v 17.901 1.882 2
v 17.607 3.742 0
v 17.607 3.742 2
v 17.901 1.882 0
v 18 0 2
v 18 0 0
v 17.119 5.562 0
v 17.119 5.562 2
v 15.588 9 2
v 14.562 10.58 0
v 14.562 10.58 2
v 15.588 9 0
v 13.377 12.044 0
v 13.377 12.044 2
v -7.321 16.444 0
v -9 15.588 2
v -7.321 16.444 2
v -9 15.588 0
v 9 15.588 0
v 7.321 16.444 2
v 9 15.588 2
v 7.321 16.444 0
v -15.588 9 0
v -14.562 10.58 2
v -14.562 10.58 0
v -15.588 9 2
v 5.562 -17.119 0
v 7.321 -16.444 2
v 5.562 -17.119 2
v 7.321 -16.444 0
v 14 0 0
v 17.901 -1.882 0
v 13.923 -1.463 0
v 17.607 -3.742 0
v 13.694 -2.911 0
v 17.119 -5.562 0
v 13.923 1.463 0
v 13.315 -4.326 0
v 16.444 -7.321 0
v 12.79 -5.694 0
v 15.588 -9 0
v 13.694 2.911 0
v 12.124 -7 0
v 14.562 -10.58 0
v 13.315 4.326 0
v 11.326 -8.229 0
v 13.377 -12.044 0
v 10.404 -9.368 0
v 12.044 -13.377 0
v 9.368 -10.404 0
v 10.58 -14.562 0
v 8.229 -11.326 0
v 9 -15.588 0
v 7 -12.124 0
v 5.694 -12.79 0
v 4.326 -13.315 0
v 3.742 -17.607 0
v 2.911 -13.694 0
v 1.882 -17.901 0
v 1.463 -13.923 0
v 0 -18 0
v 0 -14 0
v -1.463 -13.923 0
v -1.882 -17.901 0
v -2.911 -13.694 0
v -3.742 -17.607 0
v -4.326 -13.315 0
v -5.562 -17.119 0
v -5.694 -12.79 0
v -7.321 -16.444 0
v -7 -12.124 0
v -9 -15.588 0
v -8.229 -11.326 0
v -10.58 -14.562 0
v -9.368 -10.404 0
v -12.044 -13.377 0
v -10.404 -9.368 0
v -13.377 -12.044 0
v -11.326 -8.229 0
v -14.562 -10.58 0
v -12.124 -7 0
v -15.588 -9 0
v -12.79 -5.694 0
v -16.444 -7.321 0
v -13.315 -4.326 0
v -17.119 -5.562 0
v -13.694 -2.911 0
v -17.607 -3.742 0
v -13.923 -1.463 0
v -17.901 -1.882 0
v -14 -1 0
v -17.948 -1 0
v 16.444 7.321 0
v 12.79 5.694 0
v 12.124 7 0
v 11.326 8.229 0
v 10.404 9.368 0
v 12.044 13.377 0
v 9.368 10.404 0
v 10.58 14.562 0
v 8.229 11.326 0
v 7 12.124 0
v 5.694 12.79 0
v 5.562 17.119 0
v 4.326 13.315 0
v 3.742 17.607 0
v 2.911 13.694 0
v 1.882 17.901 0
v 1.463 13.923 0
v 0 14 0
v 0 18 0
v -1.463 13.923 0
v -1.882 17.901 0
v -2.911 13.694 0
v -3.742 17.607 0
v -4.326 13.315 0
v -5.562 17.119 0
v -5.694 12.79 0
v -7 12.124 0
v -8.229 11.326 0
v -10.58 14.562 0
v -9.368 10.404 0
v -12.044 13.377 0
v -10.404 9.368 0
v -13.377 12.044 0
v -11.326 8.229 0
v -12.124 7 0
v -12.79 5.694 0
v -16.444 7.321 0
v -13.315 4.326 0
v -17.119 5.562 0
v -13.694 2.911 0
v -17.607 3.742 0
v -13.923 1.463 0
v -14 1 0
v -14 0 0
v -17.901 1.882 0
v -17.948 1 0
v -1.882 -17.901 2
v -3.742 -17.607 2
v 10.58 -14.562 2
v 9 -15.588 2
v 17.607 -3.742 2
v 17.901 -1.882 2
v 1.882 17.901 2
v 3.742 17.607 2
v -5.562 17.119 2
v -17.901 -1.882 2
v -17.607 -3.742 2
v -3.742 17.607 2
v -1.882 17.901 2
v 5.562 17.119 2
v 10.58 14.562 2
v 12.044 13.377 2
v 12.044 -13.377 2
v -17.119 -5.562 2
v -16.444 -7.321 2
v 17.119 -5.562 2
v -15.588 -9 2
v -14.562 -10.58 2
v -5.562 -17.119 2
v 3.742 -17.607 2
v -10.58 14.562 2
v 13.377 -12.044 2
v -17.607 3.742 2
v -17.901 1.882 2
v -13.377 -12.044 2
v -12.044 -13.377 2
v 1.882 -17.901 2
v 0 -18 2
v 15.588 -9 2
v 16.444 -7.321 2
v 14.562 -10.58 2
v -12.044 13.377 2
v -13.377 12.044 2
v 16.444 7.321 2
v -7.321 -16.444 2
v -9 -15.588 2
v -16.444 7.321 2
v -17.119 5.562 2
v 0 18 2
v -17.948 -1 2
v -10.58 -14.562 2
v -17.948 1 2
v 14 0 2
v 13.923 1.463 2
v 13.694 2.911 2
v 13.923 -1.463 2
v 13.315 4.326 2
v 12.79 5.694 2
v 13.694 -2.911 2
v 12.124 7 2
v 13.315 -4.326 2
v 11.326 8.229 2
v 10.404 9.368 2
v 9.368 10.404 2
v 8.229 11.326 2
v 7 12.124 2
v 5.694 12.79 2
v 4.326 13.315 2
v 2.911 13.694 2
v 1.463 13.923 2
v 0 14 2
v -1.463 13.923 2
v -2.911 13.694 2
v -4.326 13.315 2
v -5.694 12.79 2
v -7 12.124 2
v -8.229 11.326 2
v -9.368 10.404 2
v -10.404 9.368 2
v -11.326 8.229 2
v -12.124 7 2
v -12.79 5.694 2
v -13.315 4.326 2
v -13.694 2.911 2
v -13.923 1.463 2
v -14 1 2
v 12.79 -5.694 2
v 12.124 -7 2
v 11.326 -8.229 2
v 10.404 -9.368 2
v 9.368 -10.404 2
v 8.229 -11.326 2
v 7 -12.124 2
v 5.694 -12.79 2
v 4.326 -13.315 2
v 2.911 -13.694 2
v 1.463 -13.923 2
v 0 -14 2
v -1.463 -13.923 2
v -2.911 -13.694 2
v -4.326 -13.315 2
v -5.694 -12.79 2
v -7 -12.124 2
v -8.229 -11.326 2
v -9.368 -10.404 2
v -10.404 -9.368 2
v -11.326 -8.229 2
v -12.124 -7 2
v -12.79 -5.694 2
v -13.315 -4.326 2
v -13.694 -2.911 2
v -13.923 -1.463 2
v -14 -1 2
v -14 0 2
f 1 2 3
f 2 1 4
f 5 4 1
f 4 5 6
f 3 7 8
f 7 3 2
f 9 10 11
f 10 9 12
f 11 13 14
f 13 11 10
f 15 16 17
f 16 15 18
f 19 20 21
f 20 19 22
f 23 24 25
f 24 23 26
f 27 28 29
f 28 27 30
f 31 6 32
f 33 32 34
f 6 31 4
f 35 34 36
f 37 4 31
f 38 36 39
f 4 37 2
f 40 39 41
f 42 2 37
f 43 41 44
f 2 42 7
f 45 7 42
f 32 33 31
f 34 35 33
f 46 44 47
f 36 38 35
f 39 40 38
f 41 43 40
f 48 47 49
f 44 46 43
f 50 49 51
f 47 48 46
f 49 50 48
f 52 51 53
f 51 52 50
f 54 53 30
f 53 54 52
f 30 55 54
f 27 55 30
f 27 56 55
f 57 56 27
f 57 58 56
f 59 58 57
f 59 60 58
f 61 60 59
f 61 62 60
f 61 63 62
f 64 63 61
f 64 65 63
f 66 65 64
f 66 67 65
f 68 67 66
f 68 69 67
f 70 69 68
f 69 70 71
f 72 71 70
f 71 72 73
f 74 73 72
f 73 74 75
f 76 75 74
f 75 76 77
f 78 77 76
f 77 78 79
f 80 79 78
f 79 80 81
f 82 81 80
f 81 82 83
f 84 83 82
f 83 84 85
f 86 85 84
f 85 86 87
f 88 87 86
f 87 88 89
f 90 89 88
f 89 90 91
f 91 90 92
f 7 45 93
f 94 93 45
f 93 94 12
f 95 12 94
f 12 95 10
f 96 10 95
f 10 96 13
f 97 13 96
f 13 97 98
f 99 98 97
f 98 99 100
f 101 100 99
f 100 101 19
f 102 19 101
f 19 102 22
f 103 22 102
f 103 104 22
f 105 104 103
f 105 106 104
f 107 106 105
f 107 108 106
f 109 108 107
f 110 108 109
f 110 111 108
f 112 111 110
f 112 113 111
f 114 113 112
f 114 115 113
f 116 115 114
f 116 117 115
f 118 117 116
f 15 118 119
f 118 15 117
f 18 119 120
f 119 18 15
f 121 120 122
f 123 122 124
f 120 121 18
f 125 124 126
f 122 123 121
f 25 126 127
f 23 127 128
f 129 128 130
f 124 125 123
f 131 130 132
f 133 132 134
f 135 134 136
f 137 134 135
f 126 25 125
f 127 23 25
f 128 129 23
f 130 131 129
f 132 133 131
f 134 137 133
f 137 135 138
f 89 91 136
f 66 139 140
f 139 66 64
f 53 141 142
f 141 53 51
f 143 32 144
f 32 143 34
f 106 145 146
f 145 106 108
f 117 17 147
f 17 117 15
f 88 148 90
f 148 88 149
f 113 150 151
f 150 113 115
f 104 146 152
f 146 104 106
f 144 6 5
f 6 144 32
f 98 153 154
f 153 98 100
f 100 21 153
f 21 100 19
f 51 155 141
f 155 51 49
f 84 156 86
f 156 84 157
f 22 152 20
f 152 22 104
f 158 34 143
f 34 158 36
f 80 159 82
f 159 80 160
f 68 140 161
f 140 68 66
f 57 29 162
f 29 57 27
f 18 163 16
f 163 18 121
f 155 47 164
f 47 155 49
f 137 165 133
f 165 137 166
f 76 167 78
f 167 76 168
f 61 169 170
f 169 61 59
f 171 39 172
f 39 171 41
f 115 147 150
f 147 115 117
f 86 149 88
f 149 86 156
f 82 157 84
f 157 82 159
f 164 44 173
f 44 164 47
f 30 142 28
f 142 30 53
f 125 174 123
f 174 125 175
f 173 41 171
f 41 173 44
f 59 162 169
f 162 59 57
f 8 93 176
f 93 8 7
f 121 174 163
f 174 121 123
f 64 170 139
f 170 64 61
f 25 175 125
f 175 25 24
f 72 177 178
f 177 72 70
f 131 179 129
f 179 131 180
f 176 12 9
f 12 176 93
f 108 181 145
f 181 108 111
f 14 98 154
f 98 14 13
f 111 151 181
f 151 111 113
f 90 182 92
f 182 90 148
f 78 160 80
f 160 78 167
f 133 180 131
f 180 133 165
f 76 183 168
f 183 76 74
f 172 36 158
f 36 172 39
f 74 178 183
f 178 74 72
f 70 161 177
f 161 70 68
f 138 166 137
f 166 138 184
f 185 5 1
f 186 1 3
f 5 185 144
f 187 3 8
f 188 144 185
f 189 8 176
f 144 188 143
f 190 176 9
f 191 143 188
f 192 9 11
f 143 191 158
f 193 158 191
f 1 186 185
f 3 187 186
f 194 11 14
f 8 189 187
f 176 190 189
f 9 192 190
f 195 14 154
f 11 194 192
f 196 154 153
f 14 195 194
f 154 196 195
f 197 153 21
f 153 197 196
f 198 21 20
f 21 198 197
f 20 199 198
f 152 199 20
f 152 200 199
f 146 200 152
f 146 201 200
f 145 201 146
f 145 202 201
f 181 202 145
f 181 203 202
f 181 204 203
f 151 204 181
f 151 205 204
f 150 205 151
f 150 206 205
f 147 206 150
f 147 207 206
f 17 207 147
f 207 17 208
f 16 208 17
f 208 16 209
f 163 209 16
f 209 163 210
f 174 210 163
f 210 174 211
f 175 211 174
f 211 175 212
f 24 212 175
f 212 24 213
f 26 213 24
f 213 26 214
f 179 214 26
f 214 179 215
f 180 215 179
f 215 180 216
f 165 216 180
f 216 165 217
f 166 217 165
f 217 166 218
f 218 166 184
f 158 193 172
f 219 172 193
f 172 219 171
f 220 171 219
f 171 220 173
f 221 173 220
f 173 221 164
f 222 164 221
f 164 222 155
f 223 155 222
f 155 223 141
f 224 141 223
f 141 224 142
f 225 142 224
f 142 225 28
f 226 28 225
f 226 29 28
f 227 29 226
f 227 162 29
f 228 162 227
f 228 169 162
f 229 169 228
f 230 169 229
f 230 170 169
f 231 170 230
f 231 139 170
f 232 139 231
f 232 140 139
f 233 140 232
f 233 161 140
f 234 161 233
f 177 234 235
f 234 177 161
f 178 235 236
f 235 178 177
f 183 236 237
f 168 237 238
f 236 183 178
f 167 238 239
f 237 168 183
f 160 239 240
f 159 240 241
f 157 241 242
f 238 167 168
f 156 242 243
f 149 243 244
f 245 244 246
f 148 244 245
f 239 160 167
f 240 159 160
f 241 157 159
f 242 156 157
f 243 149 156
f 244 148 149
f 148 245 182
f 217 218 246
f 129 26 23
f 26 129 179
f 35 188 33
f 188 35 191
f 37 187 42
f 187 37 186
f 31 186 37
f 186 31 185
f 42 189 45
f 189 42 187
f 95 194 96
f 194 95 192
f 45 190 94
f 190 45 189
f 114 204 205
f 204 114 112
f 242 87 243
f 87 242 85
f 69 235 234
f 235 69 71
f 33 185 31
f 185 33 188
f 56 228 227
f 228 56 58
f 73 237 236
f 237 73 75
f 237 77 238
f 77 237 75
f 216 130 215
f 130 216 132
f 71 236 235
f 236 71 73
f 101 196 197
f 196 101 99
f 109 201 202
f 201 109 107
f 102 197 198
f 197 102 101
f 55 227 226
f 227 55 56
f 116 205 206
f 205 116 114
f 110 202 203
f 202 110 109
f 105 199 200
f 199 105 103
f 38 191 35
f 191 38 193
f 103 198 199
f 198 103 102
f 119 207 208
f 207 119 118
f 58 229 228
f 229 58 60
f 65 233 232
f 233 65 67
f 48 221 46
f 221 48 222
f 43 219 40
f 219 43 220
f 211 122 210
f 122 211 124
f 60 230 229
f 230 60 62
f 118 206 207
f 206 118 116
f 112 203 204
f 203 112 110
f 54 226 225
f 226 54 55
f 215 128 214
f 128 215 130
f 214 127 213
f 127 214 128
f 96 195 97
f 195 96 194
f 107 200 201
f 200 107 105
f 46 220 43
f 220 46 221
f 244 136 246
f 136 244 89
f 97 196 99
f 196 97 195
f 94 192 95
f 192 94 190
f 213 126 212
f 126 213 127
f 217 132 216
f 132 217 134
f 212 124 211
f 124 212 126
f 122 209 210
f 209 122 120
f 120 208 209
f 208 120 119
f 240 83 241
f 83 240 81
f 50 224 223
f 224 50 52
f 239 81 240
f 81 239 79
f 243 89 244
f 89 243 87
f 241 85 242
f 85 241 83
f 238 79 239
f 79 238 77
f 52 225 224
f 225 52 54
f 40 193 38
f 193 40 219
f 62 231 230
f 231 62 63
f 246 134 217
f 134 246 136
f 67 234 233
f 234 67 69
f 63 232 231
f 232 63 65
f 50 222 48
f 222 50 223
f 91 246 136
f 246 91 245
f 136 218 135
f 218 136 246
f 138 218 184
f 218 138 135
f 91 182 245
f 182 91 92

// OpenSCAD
// Internal retaining ring.
$fn = 60;
eps = 0.02;
inner_d = 28;
outer_d = 36;
thickness = max(2, 1.5);
difference() { cylinder(d=outer_d,h=thickness); translate([0,0,-eps]) cylinder(d=inner_d,h=thickness+2*eps); translate([-outer_d/2-eps,-1,-eps]) cube([outer_d/2-inner_d/2+eps,2,thickness+2*eps]); }
